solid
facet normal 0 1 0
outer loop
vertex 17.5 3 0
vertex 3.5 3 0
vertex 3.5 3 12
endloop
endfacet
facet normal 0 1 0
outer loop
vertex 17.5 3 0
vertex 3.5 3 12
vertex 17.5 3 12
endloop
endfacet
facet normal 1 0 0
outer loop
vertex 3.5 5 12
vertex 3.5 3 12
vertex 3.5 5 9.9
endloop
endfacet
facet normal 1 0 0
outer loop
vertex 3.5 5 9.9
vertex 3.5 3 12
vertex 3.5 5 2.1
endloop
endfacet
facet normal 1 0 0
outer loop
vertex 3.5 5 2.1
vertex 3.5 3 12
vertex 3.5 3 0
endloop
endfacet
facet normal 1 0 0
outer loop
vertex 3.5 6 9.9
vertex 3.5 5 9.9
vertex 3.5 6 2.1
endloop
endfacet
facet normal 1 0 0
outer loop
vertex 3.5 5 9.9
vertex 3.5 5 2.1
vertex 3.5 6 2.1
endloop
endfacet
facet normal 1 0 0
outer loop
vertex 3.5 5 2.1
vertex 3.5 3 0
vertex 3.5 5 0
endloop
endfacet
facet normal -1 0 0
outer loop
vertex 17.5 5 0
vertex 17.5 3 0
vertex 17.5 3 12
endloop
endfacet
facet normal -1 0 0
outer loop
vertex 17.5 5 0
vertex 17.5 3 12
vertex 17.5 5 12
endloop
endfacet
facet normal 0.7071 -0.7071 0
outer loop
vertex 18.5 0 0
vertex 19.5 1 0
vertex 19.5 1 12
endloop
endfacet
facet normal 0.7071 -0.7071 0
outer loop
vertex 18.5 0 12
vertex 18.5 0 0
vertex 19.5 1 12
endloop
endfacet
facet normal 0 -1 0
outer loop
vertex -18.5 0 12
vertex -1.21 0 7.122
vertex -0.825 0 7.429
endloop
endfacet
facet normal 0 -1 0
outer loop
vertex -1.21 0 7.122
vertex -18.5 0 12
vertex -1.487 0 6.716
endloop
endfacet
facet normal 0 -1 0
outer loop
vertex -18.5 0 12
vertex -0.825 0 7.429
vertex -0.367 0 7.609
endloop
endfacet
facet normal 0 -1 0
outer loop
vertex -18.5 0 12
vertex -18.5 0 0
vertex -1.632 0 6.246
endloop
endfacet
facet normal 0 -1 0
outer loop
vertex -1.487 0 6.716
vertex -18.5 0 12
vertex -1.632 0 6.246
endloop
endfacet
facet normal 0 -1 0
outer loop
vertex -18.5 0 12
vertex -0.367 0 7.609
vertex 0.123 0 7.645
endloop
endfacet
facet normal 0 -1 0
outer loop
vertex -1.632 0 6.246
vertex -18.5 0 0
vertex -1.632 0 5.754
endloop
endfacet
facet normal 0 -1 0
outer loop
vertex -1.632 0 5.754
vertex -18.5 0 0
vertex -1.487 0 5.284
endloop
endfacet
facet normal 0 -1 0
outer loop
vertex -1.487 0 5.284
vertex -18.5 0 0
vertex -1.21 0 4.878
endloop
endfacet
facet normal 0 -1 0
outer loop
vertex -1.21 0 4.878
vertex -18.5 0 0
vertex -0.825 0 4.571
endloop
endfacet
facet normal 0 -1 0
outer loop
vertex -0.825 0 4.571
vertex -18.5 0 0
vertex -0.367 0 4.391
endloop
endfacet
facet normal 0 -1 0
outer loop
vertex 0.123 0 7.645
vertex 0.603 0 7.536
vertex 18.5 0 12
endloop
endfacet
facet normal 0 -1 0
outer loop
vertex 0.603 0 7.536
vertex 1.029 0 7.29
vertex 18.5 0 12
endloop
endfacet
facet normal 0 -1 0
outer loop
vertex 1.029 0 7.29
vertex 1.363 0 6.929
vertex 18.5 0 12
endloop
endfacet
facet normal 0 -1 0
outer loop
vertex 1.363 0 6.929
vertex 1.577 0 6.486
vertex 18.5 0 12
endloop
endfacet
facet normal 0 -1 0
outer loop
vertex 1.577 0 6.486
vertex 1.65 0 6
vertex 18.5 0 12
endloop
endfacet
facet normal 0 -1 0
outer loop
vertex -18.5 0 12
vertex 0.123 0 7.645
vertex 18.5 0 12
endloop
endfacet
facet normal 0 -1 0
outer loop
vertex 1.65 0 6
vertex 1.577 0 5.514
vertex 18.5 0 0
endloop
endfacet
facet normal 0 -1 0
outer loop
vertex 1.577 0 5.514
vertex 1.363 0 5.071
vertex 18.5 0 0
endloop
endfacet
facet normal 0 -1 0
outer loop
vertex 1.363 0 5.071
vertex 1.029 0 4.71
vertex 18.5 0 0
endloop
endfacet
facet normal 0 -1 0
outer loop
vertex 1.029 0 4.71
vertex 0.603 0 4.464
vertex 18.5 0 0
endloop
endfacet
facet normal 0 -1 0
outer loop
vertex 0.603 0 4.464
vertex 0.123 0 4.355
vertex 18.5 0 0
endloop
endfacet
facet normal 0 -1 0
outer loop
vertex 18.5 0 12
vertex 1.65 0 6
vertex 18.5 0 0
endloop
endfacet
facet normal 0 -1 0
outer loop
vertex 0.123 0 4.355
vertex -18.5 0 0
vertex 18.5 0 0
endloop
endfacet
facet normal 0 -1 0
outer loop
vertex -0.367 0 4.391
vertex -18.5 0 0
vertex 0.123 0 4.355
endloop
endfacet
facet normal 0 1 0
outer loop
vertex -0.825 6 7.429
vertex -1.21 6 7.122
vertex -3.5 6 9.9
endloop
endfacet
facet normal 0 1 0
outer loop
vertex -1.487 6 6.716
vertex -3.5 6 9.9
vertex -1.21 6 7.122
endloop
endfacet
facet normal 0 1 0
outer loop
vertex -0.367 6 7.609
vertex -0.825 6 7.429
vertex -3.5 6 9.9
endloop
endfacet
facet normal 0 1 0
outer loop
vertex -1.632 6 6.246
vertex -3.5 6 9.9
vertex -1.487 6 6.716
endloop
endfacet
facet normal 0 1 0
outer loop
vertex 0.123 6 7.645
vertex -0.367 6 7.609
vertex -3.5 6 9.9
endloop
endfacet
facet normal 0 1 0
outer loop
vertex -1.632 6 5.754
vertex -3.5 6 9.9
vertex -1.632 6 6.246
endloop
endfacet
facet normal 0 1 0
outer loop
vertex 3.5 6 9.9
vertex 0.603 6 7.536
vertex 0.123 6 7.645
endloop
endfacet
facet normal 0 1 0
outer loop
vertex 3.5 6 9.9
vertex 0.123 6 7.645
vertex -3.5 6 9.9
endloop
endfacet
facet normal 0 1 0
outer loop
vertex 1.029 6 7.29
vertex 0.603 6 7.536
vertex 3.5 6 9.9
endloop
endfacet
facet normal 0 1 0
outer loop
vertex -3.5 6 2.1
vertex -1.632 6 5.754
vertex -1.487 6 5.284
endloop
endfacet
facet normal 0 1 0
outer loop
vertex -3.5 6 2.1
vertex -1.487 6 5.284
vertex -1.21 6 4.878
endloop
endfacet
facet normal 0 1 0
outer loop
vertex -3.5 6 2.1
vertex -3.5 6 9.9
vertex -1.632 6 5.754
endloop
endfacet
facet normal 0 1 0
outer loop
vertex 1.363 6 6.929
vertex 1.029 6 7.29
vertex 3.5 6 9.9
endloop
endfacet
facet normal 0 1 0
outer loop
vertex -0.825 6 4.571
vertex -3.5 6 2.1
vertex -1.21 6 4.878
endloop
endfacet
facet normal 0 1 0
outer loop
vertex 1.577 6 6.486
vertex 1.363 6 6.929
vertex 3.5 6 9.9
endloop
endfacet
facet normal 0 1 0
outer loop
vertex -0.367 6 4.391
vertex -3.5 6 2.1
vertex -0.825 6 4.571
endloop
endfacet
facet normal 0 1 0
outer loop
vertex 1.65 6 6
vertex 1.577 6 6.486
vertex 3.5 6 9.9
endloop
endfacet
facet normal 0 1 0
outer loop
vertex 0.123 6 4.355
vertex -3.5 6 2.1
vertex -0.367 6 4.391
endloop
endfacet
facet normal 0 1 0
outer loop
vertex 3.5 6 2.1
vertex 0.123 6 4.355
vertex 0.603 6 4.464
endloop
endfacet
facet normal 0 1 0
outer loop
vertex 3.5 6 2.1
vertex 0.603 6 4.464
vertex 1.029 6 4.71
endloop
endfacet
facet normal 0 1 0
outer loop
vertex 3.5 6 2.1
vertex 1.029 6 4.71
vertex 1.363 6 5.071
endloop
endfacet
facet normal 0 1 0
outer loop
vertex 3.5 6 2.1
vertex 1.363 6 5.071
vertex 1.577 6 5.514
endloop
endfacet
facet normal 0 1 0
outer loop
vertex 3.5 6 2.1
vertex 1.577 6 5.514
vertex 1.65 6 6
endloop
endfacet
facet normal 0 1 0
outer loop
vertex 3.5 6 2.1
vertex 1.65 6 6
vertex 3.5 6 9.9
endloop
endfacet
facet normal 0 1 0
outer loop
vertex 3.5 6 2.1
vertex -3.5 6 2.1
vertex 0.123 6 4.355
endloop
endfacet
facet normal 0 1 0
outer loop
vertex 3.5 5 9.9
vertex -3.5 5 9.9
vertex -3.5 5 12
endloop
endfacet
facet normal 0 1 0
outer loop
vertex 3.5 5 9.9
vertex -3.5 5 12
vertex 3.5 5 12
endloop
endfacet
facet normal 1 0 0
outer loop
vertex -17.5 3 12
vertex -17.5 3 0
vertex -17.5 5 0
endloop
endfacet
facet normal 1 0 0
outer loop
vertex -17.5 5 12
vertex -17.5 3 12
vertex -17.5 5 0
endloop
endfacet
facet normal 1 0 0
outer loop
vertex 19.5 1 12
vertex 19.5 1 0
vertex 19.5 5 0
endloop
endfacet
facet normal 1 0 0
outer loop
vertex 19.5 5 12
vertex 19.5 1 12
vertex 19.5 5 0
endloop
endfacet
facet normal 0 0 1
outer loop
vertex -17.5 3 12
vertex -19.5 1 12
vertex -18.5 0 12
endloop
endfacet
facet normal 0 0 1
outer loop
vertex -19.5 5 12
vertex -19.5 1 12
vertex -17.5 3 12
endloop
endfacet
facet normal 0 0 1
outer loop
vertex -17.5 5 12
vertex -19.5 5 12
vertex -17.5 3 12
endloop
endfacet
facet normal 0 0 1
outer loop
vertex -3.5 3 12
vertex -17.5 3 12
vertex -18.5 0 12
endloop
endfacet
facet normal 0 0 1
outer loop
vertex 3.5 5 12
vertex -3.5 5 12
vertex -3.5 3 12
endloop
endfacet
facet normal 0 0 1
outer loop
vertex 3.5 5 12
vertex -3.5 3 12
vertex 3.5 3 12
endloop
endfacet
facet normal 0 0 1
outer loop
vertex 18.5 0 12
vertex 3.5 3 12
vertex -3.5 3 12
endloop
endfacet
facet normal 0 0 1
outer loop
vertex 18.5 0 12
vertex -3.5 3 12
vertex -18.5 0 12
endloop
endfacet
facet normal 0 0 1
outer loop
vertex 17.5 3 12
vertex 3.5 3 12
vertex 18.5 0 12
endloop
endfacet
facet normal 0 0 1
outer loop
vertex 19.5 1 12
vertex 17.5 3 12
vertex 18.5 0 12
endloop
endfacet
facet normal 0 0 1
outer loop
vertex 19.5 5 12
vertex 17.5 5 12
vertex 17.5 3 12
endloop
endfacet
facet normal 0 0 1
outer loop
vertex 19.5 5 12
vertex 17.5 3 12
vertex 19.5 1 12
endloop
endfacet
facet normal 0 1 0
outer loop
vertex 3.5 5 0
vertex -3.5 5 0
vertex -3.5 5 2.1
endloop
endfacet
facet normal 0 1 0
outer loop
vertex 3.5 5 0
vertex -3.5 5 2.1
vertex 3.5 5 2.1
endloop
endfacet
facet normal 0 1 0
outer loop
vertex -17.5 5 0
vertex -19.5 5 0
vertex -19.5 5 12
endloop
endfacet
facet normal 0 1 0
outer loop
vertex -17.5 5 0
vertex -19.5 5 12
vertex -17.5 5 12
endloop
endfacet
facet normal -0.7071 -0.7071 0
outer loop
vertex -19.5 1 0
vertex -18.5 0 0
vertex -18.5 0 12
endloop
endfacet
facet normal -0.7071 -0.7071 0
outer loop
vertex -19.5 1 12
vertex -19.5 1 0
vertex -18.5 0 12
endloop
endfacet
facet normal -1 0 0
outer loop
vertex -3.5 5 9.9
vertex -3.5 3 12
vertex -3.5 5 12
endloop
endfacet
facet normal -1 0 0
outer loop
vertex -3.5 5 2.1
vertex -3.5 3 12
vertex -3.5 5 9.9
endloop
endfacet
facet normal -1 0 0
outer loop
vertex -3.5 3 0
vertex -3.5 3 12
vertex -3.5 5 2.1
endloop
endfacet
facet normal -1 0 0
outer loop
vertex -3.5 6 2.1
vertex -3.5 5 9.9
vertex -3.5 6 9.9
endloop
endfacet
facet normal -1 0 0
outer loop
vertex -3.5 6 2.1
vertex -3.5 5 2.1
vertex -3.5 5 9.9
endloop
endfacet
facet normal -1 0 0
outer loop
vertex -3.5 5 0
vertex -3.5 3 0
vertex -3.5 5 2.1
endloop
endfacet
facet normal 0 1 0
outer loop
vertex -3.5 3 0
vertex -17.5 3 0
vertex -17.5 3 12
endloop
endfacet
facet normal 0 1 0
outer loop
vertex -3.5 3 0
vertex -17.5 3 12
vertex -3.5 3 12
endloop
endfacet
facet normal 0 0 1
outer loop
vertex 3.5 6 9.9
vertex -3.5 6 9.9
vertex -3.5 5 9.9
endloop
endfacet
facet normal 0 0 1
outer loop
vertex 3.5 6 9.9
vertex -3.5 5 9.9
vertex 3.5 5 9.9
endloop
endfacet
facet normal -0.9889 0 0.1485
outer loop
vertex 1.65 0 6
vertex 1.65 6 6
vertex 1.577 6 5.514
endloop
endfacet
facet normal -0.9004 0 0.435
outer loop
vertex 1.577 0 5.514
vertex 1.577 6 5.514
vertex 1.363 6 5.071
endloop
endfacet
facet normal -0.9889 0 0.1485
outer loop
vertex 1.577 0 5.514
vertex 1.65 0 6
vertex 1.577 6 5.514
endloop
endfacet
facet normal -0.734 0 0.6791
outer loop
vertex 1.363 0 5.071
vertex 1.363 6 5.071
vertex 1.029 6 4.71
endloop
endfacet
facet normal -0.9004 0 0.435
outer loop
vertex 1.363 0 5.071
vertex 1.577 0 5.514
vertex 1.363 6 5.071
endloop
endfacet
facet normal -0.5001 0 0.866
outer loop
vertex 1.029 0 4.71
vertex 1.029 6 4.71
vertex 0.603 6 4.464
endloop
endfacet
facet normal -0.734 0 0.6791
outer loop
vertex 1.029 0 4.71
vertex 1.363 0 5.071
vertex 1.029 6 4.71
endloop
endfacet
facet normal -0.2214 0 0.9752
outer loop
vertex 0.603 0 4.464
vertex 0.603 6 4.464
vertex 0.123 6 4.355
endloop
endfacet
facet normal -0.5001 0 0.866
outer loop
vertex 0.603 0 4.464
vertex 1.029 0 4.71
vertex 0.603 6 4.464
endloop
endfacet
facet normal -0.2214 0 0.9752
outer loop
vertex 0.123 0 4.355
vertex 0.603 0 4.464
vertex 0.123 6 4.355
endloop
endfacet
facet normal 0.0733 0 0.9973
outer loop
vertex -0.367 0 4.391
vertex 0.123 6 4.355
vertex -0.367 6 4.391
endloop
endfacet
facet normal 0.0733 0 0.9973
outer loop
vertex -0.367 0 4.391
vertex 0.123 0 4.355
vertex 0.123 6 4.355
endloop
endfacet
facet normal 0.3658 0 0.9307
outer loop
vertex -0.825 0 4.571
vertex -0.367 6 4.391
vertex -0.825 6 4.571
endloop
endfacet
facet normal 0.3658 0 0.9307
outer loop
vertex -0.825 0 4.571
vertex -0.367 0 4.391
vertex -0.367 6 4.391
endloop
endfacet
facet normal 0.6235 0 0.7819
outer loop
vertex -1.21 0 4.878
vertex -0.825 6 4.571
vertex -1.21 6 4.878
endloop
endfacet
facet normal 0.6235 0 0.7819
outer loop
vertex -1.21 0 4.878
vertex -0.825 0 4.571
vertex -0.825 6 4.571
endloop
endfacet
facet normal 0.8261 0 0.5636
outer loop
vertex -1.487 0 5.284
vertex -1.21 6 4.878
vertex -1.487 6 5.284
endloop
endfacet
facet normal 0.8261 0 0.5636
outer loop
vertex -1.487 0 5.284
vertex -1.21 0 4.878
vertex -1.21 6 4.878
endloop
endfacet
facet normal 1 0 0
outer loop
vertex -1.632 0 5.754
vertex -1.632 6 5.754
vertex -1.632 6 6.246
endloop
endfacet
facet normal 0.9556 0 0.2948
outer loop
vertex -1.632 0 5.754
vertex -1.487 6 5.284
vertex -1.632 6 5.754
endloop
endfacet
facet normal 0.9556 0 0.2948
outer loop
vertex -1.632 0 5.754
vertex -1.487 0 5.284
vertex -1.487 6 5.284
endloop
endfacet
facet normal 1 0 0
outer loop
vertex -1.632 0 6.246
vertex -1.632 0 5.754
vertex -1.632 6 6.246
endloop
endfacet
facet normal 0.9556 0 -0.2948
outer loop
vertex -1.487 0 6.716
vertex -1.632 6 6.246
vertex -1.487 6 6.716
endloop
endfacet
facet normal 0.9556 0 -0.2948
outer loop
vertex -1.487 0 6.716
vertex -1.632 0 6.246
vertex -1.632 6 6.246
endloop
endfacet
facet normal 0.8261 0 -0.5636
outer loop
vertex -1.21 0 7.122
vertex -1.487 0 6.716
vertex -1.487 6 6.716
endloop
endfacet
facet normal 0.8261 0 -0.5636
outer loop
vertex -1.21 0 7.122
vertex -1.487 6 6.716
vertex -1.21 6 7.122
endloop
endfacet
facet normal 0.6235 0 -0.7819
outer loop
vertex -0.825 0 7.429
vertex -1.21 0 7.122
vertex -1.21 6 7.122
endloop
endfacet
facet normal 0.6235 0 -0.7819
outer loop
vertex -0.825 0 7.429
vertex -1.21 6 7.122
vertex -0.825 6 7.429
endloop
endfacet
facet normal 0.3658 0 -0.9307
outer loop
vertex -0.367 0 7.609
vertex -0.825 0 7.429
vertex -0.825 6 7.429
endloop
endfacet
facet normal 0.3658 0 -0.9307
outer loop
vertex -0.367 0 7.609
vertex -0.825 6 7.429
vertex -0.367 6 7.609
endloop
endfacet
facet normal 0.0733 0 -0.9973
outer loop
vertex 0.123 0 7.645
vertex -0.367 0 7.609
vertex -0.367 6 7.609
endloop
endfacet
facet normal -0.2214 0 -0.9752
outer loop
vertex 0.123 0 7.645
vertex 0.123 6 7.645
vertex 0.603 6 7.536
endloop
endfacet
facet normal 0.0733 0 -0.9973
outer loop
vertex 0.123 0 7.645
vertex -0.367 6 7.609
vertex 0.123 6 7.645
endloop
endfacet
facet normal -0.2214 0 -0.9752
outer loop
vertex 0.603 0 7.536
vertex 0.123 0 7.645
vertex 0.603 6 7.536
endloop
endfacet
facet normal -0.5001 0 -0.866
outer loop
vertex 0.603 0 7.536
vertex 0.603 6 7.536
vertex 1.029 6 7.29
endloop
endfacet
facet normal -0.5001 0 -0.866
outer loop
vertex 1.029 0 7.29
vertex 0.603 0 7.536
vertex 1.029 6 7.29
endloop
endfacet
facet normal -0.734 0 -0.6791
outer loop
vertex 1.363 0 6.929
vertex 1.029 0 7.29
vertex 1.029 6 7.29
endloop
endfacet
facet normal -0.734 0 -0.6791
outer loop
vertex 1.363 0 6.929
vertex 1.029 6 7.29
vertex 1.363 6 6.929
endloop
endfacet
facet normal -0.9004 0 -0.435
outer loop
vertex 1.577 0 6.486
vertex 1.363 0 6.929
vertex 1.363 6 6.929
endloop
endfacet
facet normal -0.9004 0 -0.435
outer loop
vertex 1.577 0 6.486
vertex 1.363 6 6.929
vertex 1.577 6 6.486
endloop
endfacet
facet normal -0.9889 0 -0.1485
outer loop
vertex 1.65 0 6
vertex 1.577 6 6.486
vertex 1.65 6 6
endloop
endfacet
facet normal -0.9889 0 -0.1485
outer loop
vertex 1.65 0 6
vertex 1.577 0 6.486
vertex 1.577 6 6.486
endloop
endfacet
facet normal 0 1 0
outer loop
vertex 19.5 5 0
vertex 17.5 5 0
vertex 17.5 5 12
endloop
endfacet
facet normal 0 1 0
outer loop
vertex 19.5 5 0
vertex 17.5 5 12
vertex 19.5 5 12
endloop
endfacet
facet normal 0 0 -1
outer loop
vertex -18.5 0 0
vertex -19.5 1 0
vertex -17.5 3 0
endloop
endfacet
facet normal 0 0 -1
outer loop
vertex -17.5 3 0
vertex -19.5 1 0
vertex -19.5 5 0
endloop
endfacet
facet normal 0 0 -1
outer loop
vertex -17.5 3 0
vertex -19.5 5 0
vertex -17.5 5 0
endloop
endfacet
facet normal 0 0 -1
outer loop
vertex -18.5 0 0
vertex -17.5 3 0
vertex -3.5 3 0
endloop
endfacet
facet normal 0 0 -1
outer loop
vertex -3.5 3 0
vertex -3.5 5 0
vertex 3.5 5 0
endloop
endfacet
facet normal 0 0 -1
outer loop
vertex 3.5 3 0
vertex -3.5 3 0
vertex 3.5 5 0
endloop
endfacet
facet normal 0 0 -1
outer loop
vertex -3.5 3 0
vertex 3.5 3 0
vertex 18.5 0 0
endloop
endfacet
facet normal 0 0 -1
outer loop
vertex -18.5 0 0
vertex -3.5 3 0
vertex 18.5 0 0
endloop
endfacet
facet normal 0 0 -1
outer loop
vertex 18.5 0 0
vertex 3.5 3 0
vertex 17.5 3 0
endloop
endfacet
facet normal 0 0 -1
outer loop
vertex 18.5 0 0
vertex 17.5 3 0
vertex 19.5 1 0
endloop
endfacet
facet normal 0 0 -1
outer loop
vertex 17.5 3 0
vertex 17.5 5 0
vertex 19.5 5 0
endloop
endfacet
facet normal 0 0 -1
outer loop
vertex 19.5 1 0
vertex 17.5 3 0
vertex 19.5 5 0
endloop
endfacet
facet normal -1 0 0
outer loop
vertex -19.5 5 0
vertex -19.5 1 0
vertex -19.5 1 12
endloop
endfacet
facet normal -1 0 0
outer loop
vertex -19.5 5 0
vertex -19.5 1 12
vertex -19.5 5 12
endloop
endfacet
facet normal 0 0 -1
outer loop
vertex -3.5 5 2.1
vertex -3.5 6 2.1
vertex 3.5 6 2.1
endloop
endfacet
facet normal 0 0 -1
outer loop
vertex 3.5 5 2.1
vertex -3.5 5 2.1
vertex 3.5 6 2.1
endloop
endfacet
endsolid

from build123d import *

# Parameters (mm, degrees)
CYLINDER002_R     = 1.65
CYLINDER002_DEPTH = 10
BOX005_W          = 7
BOX005_H          = 5
BOX005_DEPTH      = 12
BOX006_W          = 14
BOX006_H          = 3
BOX006_DEPTH      = 12
BOX007_W          = 2
BOX007_H          = 5
BOX007_DEPTH      = 12
BOX008_W          = 14
BOX008_H          = 3
BOX008_DEPTH      = 12
BOX009_W          = 2
BOX009_H          = 5
BOX009_DEPTH      = 12
BOX010_W          = 7
BOX010_H          = 2
BOX010_DEPTH      = 7.8
CHAMFER005_SIZE   = 1


with BuildPart() as cylinder002:
    # Cylinder002 → Cylinder002 (new body)
    with BuildSketch(Plane(origin=(0, 0, 6), x_dir=(1, 0, 0), z_dir=(0, 1, 0))):
        Circle(CYLINDER002_R)
    extrude(amount=CYLINDER002_DEPTH)


with BuildPart() as cube005:
    # Box005 → Box005 (new body)
    with BuildSketch(Plane(origin=(-3.5, 0, 0), x_dir=(1, 0, 0), z_dir=(0, 0, 1))):
        with Locations((3.5, 2.5)):
            Rectangle(BOX005_W, BOX005_H)
    extrude(amount=BOX005_DEPTH)


with BuildPart() as cube006:
    # Box006 → Box006 (new body)
    with BuildSketch(Plane(origin=(3.5, 0, 0), x_dir=(1, 0, 0), z_dir=(0, 0, 1))):
        with Locations((7, 1.5)):
            Rectangle(BOX006_W, BOX006_H)
    extrude(amount=BOX006_DEPTH)


with BuildPart() as cube007:
    # Box007 → Box007 (new body)
    with BuildSketch(Plane(origin=(17.5, 0, 0), x_dir=(1, 0, 0), z_dir=(0, 0, 1))):
        with Locations((1, 2.5)):
            Rectangle(BOX007_W, BOX007_H)
    extrude(amount=BOX007_DEPTH)


with BuildPart() as cube008:
    # Box008 → Box008 (new body)
    with BuildSketch(Plane(origin=(-17.5, 0, 0), x_dir=(1, 0, 0), z_dir=(0, 0, 1))):
        with Locations((7, 1.5)):
            Rectangle(BOX008_W, BOX008_H)
    extrude(amount=BOX008_DEPTH)


with BuildPart() as cube009:
    # Box009 → Box009 (new body)
    with BuildSketch(Plane(origin=(-19.5, 0, 0), x_dir=(1, 0, 0), z_dir=(0, 0, 1))):
        with Locations((1, 2.5)):
            Rectangle(BOX009_W, BOX009_H)
    extrude(amount=BOX009_DEPTH)


with BuildPart() as chamfer005:
    # Box010 → Box010 (new body)
    with BuildSketch(Plane(origin=(-3.5, 4, 2.1), x_dir=(1, 0, 0), z_dir=(0, 0, 1))):
        with Locations((3.5, 1)):
            Rectangle(BOX010_W, BOX010_H)
    extrude(amount=BOX010_DEPTH)

    # Fusion003: union Cube005, Cube006, Cube007, Cube008, Cube009
    add(cube005.part)
    add(cube006.part)
    add(cube007.part)
    add(cube008.part)
    add(cube009.part)

    # Cut003: cut Cylinder002
    add(cylinder002.part, mode=Mode.SUBTRACT)

    # Chamfer005
    chamfer005_edges = [chamfer005.edges().sort_by_distance(p)[0] for p in [
        (-19.5, 0, 6),
        (19.5, 0, 6),
    ]]
    chamfer(chamfer005_edges, length=CHAMFER005_SIZE)


solid = chamfer005.part
